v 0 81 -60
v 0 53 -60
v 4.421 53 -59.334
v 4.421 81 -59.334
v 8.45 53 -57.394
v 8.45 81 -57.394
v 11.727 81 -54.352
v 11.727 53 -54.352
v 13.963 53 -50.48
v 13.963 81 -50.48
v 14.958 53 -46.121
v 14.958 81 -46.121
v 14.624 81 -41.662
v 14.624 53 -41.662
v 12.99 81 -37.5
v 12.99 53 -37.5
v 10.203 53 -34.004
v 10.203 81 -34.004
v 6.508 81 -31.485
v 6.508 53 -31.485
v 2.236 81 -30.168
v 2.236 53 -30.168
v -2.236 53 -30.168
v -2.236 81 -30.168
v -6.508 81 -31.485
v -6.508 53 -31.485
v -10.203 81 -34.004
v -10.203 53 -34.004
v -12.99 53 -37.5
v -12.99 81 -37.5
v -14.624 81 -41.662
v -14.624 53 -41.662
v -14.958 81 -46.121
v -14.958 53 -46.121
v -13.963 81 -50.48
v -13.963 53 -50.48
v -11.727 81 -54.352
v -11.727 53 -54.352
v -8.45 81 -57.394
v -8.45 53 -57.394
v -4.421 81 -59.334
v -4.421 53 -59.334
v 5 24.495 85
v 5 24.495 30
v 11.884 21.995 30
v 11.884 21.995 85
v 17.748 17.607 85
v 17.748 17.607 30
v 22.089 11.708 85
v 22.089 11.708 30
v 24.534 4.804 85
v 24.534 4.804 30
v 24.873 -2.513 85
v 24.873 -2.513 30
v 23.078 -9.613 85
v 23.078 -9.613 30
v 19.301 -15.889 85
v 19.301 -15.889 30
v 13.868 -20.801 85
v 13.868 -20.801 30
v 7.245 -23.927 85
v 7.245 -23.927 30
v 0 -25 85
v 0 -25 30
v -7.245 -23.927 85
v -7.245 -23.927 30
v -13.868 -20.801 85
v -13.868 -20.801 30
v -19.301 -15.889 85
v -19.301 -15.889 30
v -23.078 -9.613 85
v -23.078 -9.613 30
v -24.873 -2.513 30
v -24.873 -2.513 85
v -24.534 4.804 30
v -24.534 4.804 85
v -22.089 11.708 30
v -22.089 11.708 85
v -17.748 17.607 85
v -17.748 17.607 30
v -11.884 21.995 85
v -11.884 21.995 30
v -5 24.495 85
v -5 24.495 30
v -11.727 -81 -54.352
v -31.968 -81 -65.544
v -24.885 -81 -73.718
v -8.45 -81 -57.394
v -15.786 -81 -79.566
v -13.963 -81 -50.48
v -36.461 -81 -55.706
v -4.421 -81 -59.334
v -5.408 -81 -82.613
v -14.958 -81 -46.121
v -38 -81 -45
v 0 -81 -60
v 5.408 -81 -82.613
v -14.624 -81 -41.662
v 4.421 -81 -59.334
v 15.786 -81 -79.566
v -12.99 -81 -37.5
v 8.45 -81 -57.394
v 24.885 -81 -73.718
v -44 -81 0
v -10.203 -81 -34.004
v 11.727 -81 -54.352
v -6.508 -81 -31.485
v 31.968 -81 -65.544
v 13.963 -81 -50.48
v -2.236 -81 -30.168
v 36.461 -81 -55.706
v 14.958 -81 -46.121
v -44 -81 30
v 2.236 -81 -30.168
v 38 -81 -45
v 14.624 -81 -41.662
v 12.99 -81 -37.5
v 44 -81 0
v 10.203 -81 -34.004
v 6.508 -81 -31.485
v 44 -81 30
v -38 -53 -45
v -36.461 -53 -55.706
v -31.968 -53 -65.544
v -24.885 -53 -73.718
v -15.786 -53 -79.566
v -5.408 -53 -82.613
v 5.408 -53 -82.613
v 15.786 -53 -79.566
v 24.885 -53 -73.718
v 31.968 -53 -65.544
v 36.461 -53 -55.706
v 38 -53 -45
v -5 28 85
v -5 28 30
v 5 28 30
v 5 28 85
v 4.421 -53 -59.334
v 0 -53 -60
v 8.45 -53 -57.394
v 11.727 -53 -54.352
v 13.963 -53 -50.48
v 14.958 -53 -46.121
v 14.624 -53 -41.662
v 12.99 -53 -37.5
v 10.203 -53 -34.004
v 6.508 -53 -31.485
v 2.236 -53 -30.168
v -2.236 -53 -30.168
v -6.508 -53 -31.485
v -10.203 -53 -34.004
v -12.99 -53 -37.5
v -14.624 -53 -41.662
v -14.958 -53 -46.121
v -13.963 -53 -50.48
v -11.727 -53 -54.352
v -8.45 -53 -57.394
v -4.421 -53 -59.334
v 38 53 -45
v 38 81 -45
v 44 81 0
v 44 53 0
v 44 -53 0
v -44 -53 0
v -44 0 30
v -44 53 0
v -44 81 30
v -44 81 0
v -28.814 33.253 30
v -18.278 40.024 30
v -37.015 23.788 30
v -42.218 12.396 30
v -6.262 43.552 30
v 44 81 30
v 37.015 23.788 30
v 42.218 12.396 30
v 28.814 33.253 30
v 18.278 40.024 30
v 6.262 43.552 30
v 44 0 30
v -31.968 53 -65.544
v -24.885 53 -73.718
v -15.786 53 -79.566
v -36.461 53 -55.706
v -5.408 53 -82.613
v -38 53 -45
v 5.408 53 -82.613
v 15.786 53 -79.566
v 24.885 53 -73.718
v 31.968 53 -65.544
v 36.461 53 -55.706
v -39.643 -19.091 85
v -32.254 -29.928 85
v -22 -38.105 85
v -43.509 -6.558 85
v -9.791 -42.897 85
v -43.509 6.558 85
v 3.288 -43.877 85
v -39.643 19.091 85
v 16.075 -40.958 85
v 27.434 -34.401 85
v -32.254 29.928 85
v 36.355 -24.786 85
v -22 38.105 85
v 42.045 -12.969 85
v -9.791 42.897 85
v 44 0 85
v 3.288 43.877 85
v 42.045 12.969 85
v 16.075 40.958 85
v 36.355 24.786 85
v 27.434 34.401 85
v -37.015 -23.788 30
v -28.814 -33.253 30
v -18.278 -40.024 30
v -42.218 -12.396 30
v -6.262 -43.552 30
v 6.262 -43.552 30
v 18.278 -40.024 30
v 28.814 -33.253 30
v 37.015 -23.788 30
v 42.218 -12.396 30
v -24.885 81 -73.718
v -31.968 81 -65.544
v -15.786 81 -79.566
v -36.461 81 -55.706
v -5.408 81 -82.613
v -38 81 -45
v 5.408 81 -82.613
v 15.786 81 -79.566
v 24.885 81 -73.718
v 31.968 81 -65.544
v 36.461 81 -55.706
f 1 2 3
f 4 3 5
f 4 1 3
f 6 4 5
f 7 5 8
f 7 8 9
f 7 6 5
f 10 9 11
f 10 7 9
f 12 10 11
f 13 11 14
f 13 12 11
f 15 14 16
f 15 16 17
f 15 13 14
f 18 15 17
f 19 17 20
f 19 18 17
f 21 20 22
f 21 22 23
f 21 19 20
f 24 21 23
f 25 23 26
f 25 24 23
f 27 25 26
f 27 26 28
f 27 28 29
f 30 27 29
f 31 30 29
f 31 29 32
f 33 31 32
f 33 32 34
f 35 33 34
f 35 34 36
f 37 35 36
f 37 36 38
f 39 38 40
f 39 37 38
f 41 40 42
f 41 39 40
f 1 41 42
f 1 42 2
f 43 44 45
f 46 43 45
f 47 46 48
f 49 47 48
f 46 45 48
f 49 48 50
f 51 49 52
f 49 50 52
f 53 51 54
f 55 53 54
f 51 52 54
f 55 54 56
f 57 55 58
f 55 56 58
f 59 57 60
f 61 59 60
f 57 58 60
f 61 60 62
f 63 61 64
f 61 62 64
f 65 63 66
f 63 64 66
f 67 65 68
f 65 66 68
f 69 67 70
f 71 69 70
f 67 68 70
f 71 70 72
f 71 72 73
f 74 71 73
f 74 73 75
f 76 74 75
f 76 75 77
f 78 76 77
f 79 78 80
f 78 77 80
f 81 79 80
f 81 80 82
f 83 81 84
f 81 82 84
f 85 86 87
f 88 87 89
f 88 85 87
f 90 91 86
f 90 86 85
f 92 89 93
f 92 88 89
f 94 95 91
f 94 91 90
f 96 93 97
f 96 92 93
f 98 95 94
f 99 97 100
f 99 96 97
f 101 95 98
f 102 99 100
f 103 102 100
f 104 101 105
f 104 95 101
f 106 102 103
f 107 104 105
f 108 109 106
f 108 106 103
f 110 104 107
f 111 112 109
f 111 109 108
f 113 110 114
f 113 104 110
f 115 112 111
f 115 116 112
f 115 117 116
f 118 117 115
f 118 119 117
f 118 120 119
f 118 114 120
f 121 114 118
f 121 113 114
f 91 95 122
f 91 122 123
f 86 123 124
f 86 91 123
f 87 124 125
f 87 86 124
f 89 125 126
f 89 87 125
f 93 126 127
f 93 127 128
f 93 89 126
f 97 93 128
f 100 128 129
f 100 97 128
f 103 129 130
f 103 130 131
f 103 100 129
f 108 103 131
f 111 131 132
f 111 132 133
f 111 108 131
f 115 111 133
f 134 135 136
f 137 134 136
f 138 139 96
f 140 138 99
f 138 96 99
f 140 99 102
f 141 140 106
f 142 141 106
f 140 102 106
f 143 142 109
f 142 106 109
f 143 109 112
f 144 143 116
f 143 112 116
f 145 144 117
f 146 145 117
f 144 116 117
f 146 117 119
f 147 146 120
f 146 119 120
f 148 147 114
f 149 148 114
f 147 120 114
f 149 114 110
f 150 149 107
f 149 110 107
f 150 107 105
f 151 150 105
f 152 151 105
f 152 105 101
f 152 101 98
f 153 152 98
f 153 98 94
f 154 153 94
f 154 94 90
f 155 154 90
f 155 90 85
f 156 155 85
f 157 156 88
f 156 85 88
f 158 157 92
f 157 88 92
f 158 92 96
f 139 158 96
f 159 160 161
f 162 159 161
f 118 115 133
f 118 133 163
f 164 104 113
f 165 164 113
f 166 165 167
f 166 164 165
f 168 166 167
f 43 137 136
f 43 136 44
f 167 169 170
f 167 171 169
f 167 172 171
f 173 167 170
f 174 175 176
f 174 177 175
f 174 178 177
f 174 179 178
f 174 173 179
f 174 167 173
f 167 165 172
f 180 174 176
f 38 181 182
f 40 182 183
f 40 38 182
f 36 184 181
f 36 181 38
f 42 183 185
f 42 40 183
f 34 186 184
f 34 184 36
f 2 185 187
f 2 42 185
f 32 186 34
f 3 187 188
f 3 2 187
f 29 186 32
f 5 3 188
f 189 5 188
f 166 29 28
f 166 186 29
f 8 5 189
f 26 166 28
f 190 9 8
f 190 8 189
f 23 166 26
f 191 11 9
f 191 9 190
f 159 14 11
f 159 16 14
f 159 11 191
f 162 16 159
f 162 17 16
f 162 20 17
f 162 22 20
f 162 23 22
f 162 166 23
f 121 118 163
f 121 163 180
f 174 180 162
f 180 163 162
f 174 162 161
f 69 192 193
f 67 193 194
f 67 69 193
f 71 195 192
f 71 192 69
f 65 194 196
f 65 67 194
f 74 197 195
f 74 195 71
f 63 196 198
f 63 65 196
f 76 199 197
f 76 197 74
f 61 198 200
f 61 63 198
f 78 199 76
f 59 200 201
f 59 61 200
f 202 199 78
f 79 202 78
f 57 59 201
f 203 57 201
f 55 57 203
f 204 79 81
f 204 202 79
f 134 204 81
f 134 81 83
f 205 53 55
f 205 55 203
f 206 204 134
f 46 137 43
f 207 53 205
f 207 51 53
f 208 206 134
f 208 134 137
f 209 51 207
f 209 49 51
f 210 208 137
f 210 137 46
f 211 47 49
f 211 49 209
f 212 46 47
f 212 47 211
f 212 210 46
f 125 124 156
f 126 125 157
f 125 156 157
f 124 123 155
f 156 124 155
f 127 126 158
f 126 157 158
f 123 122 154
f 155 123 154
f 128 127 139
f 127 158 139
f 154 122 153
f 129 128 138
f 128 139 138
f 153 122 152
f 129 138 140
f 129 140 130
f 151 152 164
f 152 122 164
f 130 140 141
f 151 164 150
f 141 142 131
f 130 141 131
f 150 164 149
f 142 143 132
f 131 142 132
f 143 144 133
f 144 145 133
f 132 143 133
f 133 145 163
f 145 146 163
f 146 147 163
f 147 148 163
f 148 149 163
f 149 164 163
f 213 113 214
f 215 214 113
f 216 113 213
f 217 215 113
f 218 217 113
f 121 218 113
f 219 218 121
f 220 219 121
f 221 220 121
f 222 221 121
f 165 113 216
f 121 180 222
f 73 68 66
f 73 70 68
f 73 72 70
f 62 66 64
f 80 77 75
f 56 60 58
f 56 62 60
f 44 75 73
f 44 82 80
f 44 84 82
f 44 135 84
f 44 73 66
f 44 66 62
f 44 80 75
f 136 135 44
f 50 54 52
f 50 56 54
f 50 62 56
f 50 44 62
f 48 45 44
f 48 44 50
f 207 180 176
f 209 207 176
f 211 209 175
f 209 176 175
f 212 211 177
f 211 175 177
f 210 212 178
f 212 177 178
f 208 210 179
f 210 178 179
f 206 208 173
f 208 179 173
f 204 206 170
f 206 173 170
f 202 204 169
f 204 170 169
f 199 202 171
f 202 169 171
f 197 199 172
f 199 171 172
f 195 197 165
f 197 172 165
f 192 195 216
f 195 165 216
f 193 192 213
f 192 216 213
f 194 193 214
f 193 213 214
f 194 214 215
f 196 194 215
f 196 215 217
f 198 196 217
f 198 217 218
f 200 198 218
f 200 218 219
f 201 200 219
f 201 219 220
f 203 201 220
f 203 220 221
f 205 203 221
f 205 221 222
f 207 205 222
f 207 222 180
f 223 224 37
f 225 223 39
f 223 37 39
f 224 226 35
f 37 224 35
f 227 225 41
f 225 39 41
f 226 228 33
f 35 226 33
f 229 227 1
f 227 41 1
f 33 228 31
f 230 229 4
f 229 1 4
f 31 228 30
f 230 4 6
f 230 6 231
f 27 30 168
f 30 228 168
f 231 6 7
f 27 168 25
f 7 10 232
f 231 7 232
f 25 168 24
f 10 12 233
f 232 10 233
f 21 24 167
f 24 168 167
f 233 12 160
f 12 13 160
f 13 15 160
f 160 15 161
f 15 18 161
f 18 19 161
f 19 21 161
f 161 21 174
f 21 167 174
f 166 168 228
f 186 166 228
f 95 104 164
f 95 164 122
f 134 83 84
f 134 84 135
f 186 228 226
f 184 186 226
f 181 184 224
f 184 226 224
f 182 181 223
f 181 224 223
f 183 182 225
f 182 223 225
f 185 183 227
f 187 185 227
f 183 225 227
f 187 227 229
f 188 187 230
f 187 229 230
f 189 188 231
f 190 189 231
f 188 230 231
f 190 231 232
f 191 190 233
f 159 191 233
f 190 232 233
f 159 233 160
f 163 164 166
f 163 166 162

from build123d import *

# Parameters (mm, degrees)
SKETCH1_W           = 88
SKETCH1_H           = 162
BOSS_EXTRUDE1_DEPTH = 30
SKETCH2_R           = 44
BOSS_EXTRUDE2_DEPTH = 55
SKETCH3_R           = 15
BOSS_EXTRUDE3_DEPTH = 28


with BuildPart() as part:
    # Sketch1 → Boss-Extrude1 (new body)
    with BuildSketch(Plane.XY):
        Rectangle(SKETCH1_W, SKETCH1_H)
    extrude(amount=BOSS_EXTRUDE1_DEPTH)

    # Sketch2 → Boss-Extrude2 (add)
    with BuildSketch(Plane.XY.offset(30)):
        Circle(SKETCH2_R)
        with BuildLine():
            Line((-5, 24.494897428), (-5, 28))
            Line((-5, 28), (5, 28))
            Line((5, 28), (5, 24.494897428))
            ThreePointArc((5, 24.494897428), (0, -25), (-5, 24.494897428))
        make_face(mode=Mode.SUBTRACT)
    extrude(amount=BOSS_EXTRUDE2_DEPTH)

    # Sketch3 → Boss-Extrude3 (add)
    with BuildSketch(Plane.XZ.offset(81)):
        with BuildLine():
            Line((-44, 0), (-38, -45))
            ThreePointArc((-38, -45), (0, -83), (38, -45))
            Line((38, -45), (44, 0))
            Line((44, 0), (-44, 0))
        make_face()
        with Locations(Location((0, -45, 0), (0, 0, 270))):
            Circle(SKETCH3_R, mode=Mode.SUBTRACT)
    boss_extrude3 = extrude(amount=-BOSS_EXTRUDE3_DEPTH)

    # Mirror1: Boss-Extrude3 across plane
    add(boss_extrude3.mirror(Plane.ZX))


solid = part.part
